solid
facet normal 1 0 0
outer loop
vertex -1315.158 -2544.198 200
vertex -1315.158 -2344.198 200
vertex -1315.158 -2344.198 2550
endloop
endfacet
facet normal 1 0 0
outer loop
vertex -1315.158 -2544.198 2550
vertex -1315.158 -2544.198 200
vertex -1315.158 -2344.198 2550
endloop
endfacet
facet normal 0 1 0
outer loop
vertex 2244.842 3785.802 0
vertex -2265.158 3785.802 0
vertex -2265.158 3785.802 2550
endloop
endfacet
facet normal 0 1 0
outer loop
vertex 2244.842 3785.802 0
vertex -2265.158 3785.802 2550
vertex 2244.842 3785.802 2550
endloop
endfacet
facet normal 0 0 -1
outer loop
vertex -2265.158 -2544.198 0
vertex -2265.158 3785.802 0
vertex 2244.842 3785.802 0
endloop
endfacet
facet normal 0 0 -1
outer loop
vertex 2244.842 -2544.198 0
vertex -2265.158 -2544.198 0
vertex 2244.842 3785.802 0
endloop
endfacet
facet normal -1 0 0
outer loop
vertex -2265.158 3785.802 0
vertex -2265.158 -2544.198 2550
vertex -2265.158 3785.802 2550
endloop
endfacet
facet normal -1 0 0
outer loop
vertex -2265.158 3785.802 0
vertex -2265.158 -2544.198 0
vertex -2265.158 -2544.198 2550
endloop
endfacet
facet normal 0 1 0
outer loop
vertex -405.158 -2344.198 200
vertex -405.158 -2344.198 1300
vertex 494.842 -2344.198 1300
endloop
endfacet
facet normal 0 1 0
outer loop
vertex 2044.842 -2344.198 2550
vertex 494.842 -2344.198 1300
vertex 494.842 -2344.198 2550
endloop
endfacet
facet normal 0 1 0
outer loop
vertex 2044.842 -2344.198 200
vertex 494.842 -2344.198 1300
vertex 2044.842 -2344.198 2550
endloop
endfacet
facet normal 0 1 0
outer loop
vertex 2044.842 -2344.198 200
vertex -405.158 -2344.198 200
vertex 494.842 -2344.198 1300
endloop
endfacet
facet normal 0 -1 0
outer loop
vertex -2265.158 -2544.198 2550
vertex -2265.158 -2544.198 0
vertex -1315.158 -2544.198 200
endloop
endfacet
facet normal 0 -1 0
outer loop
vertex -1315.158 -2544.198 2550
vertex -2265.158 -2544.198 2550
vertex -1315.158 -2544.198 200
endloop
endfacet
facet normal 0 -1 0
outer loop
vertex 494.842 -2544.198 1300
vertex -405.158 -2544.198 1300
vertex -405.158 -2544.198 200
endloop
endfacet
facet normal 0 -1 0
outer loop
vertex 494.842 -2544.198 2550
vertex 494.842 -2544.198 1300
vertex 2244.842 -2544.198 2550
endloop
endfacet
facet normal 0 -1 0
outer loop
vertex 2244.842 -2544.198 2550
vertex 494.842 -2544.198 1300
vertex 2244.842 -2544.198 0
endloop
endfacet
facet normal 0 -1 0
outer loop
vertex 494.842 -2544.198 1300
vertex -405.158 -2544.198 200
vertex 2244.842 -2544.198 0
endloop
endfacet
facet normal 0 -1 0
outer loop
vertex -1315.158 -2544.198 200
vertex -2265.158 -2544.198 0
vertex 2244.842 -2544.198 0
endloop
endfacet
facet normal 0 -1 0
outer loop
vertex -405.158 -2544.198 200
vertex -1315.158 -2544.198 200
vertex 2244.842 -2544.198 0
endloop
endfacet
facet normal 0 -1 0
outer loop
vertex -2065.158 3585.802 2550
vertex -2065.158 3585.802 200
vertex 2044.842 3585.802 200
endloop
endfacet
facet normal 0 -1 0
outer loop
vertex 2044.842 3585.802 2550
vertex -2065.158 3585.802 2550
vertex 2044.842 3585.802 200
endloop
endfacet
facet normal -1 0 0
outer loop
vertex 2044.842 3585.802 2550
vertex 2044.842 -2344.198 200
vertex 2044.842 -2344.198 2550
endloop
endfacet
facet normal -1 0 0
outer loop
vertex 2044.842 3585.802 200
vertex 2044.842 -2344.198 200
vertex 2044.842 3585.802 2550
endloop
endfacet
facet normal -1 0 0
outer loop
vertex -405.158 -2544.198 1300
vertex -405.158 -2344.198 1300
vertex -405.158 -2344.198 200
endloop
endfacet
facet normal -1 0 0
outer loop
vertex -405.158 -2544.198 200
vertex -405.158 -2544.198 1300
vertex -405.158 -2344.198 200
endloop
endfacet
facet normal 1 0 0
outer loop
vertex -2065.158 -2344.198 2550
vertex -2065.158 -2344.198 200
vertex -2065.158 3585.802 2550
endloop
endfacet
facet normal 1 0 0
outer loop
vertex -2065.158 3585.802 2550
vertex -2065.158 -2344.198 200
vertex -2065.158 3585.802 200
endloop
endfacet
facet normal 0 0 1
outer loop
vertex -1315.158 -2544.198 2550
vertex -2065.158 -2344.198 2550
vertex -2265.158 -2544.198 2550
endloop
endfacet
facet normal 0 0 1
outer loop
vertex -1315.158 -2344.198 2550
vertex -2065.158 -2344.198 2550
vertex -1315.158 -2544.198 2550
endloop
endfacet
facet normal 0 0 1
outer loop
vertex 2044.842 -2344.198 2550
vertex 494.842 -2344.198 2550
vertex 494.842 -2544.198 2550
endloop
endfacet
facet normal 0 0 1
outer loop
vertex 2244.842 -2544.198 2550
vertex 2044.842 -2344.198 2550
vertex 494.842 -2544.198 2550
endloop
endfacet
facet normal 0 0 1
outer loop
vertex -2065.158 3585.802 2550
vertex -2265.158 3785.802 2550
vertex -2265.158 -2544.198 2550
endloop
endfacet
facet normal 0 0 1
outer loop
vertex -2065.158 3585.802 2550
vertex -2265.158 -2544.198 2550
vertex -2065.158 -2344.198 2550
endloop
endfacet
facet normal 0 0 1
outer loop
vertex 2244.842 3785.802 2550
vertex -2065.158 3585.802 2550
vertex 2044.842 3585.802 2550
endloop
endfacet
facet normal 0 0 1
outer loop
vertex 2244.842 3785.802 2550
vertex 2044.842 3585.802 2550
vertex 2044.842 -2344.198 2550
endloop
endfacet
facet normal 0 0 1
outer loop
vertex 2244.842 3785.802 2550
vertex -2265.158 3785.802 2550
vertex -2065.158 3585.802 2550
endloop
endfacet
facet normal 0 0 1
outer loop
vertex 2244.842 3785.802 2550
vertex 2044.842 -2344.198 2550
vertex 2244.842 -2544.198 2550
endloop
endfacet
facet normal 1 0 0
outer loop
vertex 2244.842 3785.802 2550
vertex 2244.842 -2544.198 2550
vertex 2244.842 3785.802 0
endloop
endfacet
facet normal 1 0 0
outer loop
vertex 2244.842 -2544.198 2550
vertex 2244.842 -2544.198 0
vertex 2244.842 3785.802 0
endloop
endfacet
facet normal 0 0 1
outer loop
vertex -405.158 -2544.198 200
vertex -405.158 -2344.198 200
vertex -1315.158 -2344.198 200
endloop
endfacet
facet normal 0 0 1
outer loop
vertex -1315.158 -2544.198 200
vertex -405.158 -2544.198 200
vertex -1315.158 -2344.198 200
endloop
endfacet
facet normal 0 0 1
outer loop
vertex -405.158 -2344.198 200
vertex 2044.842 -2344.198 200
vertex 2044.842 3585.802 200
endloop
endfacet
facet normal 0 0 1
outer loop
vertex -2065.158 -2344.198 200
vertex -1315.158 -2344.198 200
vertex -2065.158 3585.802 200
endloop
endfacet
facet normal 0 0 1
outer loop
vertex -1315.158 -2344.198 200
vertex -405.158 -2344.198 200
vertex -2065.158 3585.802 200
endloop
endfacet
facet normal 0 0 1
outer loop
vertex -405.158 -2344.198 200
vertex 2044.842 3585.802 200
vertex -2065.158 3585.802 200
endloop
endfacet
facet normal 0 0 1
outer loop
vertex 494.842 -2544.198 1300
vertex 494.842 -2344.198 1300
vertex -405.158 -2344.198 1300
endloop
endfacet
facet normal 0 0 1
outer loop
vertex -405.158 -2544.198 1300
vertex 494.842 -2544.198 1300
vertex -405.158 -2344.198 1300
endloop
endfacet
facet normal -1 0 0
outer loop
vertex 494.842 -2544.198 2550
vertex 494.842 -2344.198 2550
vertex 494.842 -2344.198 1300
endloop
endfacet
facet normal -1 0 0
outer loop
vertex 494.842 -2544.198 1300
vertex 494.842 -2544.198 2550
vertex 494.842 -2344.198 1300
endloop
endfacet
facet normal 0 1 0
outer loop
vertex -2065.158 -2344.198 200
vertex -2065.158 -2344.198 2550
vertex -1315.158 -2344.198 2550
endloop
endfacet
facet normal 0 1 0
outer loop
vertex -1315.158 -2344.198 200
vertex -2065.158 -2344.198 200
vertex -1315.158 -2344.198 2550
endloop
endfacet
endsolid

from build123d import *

# Parameters (mm, degrees)
F0_W     = 4510
F0_H     = 6330
F1_DEPTH = 200
F2_W     = 4510
F2_H     = 6330
F2_W_2   = 4110
F2_H_2   = 5930
F3_DEPTH = 2350
F5_DEPTH = 200


with BuildPart() as f1:
    # F0 (on Top) → F1 (new body)
    with BuildSketch(Plane.XY):
        with Locations((-10.15817, 620.80199)):
            Rectangle(F0_W, F0_H)
    extrude(amount=F1_DEPTH)

    # F2 (on face) → F3 (join)
    with BuildSketch(Plane.XY.offset(200)):
        with Locations((-10.15817, 620.80199)):
            Rectangle(F2_W, F2_H)
        with Locations((-10.15817, 620.80199)):
            Rectangle(F2_W_2, F2_H_2, mode=Mode.SUBTRACT)
    extrude(amount=F3_DEPTH)

    # F4 (on face) → F5 (cut, through all)
    with BuildSketch(Plane(origin=(0, -2344.19801, 0), x_dir=(-1, 0, 0), z_dir=(0, 1, 0))):
        Polygon((405.15817, 2550), (-494.84183, 2550), (-494.84183, 1300), (405.15817, 1300), (405.15817, 200), (1315.15817, 200), (1315.15817, 2550), align=None)
    extrude(amount=-F5_DEPTH, mode=Mode.SUBTRACT)


solid = f1.part
